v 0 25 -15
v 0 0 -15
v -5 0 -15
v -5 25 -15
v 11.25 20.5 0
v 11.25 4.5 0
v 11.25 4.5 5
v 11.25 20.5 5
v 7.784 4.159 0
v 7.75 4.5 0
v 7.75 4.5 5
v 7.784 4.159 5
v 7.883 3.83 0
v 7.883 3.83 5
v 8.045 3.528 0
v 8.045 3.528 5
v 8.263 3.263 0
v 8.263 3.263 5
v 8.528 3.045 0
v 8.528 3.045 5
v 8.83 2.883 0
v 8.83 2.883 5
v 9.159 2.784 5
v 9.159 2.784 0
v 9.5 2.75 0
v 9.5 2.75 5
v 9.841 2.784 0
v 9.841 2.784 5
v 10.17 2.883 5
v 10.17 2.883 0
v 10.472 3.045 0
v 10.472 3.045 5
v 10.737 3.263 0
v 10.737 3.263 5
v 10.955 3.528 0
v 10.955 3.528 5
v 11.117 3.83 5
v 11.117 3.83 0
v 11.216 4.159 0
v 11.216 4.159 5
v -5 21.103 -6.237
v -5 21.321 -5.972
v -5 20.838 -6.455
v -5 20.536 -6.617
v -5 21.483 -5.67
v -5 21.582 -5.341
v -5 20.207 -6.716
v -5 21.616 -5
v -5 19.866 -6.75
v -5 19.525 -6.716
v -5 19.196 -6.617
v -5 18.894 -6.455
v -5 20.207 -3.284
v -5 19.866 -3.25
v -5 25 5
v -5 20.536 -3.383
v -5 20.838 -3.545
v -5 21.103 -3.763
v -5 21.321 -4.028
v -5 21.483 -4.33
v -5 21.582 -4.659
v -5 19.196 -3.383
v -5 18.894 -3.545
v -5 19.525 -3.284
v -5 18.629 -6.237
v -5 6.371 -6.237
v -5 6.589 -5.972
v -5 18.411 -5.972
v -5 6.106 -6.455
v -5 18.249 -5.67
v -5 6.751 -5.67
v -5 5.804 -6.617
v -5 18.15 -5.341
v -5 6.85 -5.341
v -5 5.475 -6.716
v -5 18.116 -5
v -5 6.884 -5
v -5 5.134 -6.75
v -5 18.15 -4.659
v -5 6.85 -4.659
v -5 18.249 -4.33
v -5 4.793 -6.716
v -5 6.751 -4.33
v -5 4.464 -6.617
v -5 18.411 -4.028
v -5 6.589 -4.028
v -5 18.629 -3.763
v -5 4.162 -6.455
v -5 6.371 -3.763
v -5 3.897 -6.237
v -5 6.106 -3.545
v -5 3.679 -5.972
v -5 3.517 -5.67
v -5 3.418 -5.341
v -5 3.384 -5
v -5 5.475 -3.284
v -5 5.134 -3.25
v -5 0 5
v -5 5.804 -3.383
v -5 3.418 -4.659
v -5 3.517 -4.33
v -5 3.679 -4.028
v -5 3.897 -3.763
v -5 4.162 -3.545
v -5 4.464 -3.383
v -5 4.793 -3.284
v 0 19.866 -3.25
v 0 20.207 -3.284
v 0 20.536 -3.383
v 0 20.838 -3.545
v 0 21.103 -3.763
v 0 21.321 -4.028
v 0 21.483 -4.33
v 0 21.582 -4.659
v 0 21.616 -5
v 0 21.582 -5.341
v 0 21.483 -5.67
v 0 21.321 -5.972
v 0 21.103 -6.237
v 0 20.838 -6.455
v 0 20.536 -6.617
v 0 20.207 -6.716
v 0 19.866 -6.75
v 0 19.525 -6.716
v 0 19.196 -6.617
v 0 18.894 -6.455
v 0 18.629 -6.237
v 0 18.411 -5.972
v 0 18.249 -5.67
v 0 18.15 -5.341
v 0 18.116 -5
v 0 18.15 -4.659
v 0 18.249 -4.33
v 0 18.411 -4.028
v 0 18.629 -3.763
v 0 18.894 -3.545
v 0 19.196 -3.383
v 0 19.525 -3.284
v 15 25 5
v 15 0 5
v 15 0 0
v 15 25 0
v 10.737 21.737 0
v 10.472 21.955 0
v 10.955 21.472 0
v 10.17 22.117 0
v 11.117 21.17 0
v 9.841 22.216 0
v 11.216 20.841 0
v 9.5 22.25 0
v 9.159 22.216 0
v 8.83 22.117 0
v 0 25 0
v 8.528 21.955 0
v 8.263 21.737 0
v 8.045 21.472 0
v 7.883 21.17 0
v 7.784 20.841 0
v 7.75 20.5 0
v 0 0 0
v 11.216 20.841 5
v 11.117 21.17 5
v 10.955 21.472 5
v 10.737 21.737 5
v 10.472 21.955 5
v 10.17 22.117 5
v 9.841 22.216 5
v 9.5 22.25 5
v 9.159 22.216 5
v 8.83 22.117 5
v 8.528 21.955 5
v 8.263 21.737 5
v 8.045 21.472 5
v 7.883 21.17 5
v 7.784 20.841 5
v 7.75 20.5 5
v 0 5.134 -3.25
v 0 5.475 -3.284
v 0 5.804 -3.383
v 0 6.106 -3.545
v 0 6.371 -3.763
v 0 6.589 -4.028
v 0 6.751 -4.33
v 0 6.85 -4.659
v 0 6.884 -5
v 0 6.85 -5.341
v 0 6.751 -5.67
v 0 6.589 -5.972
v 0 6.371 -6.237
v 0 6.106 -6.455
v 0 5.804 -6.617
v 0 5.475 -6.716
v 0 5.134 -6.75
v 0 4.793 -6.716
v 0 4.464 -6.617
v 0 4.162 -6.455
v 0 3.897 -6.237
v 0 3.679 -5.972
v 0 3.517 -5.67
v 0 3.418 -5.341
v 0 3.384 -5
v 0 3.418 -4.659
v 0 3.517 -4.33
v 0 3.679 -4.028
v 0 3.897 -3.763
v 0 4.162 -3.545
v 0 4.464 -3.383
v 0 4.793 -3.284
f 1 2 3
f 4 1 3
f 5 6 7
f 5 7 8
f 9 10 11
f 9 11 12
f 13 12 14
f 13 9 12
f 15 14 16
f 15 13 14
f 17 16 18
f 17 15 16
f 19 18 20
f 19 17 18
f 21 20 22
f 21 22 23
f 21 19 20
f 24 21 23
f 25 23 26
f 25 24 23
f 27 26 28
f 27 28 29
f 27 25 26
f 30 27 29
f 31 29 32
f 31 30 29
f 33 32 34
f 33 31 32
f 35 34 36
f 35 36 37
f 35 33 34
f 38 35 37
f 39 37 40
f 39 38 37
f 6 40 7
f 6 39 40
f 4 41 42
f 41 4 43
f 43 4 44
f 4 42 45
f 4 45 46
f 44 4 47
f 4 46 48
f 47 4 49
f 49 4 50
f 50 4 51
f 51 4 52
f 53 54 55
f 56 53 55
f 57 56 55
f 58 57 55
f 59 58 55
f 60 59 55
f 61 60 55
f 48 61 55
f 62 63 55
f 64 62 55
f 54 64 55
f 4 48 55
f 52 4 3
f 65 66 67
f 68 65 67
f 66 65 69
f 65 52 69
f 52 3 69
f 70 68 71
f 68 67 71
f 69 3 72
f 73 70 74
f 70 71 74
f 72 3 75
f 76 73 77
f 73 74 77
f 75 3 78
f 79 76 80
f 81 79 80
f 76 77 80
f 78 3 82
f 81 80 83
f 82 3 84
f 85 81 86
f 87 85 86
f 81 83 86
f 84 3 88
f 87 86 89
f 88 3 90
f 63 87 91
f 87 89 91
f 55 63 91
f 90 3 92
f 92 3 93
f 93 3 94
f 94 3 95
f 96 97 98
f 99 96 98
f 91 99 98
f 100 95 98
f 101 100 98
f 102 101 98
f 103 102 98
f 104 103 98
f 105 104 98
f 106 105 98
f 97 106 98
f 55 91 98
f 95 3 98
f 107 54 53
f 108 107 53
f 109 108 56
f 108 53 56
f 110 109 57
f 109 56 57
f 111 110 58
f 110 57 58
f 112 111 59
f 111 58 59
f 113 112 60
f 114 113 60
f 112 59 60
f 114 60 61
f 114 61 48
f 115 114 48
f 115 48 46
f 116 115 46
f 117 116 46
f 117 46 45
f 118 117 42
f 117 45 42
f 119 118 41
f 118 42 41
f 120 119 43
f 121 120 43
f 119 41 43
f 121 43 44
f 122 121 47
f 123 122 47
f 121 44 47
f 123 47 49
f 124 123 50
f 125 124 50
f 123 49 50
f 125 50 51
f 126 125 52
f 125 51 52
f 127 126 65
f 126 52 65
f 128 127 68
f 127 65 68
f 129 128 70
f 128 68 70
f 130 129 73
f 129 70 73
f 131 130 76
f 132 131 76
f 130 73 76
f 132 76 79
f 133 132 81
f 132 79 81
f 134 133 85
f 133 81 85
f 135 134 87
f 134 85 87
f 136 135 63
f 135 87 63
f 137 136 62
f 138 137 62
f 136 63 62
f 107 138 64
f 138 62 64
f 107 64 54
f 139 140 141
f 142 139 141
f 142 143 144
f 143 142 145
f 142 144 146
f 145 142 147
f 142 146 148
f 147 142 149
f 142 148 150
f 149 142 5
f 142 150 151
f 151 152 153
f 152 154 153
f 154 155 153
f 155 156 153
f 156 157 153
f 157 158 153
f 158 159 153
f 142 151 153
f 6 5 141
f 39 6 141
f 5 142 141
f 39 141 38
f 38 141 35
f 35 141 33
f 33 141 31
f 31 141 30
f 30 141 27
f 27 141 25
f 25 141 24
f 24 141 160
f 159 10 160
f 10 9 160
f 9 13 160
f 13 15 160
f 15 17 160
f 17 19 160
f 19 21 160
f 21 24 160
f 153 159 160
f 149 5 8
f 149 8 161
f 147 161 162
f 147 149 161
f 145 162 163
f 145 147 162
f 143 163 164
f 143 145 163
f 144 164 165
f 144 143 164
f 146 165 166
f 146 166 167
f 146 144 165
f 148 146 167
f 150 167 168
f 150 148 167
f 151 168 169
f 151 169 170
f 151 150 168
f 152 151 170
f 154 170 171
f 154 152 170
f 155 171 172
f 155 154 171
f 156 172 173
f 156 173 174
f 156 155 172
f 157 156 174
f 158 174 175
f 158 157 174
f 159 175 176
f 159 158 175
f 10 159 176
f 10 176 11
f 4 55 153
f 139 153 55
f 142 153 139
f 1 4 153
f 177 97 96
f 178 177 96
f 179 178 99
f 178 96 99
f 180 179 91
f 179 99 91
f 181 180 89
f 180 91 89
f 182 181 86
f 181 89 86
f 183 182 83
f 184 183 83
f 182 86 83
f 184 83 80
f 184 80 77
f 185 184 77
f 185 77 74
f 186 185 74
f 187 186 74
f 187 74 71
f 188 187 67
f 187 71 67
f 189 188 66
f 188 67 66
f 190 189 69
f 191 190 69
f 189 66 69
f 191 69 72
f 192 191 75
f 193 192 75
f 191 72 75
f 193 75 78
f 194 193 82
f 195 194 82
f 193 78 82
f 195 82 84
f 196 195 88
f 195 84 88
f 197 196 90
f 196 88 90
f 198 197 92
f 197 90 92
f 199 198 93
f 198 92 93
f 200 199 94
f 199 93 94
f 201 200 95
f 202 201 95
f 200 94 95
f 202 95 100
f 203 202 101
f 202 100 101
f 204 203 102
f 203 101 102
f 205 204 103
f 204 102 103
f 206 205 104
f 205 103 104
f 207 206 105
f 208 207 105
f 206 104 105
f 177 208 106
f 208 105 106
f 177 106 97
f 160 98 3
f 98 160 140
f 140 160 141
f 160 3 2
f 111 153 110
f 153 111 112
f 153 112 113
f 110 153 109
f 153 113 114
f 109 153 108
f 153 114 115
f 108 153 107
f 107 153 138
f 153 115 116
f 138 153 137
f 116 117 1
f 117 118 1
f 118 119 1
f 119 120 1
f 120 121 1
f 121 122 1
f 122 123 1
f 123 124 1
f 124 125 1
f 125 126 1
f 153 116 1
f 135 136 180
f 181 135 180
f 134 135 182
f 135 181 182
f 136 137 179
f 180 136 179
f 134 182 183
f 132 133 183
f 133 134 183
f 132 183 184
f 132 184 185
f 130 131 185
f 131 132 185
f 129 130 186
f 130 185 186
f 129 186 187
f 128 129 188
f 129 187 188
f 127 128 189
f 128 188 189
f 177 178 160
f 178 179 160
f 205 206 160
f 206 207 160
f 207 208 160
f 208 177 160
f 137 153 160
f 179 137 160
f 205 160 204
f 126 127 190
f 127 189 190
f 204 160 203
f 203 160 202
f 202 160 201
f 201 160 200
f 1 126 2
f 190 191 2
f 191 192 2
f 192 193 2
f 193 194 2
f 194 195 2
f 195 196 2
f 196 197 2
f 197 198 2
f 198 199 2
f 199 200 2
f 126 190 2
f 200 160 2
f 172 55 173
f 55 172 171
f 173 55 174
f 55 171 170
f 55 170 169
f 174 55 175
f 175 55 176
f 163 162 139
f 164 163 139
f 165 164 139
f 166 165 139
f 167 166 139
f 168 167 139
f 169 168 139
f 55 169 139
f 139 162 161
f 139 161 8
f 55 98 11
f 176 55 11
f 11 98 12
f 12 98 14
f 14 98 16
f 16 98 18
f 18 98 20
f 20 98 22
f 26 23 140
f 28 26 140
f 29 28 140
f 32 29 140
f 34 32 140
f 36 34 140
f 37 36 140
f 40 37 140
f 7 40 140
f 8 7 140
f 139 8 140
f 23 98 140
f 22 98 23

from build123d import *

# Parameters (mm, degrees)
BOSS_EXTRUDE1_DEPTH = 25
CUT_EXTRUDE1_DEPTH  = 5
SKETCH3_R           = 1.75
CUT_EXTRUDE2_DEPTH  = 5


with BuildPart() as part:
    # Sketch1 → Boss-Extrude1 (new body)
    with BuildSketch(Plane(origin=(0, 0, 0), x_dir=(1, 0, 0), z_dir=(0, 1, 0))):
        Polygon((-5, 15), (-5, -5), (15, -5), (15, 0), (0, 0), (0, 15), align=None)
    extrude(amount=BOSS_EXTRUDE1_DEPTH)

    # Sketch2 → Cut-Extrude1 (cut)
    with BuildSketch(Plane(origin=(0, 0, 0), x_dir=(-1, 0, 0), z_dir=(0, 0, -1))):
        with BuildLine():
            Line((-7.75, 20.5), (-7.75, 4.5))
            ThreePointArc((-7.75, 4.5), (-9.5, 2.75), (-11.25, 4.5))
            Line((-11.25, 4.5), (-11.25, 20.5))
            ThreePointArc((-11.25, 20.5), (-9.5, 22.25), (-7.75, 20.5))
        make_face()
    extrude(amount=-CUT_EXTRUDE1_DEPTH, mode=Mode.SUBTRACT)

    # Sketch3 → Cut-Extrude2 (cut)
    with BuildSketch(Plane.ZY.offset(5)):
        with Locations((-5, 5.134)):
            Circle(SKETCH3_R)
        with Locations((-5, 19.866)):
            Circle(SKETCH3_R)
    extrude(amount=-CUT_EXTRUDE2_DEPTH, mode=Mode.SUBTRACT)


solid = part.part
